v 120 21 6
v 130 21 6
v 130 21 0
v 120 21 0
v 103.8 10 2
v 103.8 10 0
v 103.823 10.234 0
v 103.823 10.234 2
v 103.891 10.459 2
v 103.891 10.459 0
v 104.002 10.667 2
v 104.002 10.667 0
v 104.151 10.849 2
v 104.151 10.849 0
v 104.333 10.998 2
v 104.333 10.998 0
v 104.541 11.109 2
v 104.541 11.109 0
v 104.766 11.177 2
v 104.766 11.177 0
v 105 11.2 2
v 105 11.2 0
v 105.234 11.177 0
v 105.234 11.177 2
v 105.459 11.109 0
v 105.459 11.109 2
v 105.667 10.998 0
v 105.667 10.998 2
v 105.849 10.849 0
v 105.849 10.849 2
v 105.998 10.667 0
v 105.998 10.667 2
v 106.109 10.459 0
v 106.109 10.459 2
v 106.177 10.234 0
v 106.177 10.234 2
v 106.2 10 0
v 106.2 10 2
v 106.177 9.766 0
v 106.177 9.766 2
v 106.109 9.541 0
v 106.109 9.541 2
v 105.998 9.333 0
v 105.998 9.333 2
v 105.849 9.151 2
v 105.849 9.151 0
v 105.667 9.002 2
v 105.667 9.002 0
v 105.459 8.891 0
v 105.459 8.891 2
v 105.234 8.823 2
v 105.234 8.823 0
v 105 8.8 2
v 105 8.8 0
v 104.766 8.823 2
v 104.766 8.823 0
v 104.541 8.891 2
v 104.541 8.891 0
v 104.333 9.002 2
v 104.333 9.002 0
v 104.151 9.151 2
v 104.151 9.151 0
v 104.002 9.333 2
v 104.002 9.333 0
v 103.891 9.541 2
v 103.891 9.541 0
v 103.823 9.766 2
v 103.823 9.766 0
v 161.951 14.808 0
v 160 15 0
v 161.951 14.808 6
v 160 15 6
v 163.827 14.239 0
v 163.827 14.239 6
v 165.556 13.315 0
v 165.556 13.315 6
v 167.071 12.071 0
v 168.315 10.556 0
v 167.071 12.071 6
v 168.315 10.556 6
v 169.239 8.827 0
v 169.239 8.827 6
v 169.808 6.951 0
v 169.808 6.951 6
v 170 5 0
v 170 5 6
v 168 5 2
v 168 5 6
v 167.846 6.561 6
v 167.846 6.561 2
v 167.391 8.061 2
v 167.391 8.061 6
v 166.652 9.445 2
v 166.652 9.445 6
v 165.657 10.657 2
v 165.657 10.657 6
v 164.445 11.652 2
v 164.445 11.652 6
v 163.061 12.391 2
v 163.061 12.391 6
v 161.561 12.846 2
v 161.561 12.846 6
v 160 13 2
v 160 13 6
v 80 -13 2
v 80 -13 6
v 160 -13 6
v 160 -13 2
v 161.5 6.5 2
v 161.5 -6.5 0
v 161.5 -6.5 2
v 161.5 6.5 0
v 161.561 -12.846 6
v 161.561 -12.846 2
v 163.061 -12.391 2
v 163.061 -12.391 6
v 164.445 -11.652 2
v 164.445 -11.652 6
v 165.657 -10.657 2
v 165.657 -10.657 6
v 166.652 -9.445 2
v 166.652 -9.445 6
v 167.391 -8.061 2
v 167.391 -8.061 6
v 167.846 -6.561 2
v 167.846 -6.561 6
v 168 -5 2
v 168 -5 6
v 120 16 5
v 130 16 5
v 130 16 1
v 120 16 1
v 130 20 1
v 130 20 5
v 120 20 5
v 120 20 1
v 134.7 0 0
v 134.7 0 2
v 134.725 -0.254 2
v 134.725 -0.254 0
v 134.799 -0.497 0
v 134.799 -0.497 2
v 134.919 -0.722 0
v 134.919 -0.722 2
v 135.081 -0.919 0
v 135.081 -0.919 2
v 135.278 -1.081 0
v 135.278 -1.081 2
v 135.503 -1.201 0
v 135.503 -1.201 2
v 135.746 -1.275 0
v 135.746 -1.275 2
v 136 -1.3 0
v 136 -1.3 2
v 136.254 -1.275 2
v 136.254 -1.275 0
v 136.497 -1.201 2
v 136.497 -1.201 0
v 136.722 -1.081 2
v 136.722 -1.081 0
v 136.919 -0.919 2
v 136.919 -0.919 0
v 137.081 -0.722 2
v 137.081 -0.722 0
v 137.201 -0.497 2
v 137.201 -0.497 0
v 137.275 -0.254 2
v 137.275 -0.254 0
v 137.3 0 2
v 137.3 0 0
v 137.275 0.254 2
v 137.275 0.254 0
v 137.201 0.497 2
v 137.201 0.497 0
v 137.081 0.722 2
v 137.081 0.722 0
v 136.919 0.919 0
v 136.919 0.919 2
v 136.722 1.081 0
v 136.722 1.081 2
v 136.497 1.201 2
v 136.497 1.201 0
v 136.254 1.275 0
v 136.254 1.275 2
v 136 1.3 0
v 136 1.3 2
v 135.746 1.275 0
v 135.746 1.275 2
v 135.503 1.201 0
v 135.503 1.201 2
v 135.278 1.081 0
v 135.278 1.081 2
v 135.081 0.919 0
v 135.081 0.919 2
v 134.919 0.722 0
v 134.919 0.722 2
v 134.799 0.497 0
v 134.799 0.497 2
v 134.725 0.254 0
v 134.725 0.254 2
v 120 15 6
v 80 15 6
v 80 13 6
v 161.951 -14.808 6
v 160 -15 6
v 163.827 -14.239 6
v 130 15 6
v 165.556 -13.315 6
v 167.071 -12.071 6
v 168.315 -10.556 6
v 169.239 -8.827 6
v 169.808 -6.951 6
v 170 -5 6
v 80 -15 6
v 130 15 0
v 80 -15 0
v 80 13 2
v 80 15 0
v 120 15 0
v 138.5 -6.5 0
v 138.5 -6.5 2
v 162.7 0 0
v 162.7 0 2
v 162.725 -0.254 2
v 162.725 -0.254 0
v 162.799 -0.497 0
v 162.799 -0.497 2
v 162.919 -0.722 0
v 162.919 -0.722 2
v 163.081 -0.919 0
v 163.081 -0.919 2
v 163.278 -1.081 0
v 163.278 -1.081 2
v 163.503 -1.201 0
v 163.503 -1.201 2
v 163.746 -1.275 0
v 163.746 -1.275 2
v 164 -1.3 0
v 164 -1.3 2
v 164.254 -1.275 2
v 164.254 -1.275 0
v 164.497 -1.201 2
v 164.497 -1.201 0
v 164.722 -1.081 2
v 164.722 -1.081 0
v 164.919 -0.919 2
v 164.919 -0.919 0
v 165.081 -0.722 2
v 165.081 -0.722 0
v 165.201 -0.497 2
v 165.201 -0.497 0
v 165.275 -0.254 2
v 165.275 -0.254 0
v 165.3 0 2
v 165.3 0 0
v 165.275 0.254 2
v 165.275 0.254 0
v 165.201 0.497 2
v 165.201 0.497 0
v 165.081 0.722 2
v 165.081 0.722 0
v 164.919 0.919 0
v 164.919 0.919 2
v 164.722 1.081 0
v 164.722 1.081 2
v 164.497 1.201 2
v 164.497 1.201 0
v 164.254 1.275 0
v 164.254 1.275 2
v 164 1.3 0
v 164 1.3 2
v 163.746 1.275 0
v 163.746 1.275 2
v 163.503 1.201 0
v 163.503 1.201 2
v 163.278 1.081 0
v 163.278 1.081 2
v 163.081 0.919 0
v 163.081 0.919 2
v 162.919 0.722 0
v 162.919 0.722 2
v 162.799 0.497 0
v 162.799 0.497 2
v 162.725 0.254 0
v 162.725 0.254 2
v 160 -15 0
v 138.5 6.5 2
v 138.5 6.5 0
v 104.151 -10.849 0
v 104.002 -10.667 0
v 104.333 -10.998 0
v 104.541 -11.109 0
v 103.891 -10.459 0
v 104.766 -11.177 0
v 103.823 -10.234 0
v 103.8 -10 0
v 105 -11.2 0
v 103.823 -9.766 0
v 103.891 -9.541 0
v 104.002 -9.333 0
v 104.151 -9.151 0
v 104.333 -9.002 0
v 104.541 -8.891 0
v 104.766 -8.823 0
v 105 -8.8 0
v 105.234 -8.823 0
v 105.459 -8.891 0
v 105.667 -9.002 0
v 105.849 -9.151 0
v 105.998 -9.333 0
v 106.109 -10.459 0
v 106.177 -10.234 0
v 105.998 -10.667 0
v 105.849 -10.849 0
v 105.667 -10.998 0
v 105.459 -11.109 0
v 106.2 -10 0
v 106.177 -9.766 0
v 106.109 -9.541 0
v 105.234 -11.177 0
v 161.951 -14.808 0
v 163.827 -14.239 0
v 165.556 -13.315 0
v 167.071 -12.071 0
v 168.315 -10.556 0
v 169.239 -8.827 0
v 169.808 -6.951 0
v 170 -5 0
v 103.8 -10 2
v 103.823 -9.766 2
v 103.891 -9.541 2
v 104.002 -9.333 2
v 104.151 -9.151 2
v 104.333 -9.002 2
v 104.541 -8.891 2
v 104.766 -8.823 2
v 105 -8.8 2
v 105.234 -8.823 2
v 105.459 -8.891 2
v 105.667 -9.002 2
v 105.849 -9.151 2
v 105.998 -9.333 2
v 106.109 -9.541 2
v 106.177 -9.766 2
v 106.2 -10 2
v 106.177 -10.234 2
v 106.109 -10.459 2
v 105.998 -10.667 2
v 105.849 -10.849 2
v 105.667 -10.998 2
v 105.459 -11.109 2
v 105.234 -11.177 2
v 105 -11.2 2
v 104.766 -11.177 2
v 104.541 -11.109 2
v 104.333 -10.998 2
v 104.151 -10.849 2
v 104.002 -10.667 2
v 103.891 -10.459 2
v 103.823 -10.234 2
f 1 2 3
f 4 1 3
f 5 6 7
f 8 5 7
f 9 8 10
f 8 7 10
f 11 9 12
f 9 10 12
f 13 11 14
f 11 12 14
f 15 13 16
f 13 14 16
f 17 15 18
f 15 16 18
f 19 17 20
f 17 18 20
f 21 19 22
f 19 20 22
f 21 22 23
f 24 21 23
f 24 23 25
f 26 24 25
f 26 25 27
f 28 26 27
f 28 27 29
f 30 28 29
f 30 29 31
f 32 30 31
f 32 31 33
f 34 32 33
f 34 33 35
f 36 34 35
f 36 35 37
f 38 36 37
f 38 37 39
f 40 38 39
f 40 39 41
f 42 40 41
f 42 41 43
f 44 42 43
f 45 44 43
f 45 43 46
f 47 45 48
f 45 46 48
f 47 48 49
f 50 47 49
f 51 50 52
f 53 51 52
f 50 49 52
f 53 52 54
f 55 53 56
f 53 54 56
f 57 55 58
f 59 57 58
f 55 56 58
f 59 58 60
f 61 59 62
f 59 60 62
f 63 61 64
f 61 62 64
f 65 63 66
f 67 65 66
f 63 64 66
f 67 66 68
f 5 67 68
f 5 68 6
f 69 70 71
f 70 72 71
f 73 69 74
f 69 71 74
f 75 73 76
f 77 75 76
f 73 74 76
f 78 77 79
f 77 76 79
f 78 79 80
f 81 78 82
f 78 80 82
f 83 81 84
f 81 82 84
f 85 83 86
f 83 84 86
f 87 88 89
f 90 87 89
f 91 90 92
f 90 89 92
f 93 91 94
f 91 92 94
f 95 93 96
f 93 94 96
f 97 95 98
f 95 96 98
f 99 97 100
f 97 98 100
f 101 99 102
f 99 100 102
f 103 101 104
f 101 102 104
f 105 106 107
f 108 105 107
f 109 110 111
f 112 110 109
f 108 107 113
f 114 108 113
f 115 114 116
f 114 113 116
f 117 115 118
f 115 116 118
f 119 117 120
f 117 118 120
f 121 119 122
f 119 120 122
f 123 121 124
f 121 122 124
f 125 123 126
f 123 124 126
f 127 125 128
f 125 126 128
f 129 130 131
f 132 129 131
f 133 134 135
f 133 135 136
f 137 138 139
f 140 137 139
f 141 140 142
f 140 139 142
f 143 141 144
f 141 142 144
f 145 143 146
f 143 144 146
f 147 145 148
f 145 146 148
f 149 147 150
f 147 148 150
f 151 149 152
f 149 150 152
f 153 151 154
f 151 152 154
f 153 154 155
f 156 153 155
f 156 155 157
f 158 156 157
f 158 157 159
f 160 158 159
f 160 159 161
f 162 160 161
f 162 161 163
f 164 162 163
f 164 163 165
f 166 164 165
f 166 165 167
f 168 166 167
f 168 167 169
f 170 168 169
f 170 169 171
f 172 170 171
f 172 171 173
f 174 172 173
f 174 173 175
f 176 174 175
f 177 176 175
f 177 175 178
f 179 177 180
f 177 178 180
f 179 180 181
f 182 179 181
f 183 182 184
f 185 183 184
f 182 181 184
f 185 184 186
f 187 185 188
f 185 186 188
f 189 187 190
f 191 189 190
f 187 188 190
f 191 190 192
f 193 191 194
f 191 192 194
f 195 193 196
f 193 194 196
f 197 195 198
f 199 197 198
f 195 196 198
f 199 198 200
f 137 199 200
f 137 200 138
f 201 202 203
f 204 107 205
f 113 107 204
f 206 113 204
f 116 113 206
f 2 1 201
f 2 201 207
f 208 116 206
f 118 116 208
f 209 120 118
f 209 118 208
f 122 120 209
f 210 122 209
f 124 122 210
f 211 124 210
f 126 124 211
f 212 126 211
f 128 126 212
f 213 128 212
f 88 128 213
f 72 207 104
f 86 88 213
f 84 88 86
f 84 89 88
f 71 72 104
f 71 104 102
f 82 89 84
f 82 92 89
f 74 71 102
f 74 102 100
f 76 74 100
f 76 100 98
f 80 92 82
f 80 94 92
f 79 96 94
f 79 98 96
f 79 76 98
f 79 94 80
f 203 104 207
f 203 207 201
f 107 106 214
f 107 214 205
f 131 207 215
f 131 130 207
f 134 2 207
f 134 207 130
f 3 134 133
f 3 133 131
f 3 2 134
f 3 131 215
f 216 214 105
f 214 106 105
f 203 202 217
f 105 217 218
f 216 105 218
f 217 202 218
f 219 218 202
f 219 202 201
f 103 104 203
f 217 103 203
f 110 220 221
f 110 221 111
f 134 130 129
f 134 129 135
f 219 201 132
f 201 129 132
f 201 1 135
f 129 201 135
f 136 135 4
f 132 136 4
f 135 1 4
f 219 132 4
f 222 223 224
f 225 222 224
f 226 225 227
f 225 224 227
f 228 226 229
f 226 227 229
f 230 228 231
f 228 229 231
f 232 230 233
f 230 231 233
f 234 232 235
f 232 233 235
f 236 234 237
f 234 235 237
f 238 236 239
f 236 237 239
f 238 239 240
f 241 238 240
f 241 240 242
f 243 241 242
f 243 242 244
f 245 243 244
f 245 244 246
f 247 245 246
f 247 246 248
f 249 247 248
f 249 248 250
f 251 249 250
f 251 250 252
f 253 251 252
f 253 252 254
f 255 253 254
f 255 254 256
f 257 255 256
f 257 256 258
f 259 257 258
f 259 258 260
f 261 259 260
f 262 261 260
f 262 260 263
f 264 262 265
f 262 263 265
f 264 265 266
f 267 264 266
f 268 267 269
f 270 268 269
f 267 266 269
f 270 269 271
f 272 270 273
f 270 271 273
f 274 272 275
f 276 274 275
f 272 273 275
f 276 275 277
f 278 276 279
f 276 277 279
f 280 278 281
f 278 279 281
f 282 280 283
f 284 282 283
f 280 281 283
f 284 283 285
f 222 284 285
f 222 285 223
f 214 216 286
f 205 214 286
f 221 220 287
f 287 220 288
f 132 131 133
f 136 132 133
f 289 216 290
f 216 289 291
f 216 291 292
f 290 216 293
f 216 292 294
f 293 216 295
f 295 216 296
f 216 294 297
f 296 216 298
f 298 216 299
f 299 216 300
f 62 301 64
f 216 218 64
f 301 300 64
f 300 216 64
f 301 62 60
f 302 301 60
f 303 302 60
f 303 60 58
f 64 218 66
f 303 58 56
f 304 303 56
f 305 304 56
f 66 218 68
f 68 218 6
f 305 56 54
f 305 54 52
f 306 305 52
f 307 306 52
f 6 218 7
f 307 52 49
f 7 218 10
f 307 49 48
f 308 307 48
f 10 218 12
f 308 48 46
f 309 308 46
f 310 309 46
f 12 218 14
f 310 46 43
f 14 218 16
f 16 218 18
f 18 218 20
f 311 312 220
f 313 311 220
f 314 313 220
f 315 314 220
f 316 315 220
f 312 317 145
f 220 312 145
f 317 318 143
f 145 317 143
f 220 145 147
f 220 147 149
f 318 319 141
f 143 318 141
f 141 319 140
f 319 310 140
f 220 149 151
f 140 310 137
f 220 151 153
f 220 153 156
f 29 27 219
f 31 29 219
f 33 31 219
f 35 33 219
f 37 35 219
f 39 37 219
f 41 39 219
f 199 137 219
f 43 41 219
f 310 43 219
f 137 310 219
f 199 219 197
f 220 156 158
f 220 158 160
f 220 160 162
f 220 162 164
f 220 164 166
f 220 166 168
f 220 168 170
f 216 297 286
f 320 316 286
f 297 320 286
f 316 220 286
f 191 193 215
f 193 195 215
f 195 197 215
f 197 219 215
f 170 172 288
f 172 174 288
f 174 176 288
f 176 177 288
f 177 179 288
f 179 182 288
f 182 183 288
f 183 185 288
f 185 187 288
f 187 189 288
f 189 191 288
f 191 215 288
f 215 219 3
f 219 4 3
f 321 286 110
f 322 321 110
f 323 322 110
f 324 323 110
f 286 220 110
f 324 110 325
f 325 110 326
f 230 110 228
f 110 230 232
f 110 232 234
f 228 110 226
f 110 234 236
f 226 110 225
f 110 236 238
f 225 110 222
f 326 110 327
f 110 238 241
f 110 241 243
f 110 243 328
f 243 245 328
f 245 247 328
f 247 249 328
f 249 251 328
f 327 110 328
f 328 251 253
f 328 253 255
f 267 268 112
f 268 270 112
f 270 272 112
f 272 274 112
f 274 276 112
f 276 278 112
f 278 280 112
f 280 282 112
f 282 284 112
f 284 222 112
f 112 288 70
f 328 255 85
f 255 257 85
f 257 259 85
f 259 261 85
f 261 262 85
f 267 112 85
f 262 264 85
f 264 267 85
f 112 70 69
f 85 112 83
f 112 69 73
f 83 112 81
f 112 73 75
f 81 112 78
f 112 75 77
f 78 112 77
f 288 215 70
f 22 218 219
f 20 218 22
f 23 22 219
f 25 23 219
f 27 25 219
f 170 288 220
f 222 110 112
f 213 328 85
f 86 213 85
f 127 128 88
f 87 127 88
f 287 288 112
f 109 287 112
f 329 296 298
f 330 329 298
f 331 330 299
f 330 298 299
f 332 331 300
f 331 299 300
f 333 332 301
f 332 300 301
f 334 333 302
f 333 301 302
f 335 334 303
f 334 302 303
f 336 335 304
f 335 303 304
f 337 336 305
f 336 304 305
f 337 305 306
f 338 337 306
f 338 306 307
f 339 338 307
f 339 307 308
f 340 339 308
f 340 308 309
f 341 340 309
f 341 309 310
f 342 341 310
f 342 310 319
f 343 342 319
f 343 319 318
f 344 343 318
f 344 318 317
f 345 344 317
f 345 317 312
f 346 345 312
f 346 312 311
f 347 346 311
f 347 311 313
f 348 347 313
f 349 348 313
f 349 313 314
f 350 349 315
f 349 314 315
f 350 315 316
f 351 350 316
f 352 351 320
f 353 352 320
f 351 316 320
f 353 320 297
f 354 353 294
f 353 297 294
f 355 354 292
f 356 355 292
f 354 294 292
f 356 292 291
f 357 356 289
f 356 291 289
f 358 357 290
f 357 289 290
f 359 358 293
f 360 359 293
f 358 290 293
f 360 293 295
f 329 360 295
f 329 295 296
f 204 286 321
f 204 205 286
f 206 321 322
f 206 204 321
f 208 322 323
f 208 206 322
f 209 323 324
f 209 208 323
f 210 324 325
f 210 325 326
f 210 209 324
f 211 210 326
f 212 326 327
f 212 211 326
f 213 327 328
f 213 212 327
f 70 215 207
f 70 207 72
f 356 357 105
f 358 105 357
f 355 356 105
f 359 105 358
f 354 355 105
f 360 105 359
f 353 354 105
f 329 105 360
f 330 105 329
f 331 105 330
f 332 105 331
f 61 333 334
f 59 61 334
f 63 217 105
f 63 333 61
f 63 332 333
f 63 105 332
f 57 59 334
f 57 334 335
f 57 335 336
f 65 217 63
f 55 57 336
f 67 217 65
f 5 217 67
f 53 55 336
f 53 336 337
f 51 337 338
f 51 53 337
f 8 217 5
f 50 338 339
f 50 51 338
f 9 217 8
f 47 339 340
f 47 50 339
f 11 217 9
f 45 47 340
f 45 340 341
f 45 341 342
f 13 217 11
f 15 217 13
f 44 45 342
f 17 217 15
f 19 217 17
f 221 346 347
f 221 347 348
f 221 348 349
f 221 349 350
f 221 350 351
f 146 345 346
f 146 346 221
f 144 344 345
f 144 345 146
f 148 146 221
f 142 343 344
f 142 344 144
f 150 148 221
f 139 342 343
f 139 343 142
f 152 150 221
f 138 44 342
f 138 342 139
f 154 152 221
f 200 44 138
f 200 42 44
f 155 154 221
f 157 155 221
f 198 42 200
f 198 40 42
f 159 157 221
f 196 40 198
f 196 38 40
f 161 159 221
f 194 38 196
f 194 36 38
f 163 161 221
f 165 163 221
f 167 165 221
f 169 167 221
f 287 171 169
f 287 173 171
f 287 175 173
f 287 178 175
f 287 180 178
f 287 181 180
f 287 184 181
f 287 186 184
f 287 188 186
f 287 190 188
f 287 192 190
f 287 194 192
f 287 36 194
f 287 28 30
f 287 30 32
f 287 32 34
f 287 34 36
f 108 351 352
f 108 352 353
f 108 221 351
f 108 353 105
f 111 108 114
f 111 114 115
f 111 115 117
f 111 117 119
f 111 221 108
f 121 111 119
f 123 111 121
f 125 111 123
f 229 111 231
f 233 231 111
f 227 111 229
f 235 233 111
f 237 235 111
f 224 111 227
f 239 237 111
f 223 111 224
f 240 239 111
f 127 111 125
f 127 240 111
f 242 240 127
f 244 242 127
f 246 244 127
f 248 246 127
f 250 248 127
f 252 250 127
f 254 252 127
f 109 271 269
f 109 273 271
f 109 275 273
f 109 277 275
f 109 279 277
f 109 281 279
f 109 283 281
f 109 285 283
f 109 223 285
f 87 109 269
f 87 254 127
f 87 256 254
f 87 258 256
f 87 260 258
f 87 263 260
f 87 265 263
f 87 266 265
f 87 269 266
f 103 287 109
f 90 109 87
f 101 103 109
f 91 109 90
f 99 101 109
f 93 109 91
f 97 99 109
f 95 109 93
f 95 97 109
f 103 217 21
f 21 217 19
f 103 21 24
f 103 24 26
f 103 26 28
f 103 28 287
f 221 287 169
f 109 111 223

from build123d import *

# Parameters (mm, degrees)
SZKIC1_R                    = 22.5
DODANIE_WYCI_GNI_CIE2_DEPTH = 13
SZKIC2_W                    = 220
SZKIC2_H                    = 30
DODANIE_WYCI_GNI_CIE3_DEPTH = 6
ZAOKR_GLENIE1_R             = 10
SZKIC4_R                    = 20.5
WYTNIJ_WYCI_GNI_CIE3_DEPTH  = 11
WYTNIJ_WYCI_GNI_CIE2_DEPTH  = 4
WYTNIJ_WYCI_GNI_CIE4_REACH  = 173.975
SZKIC8_W                    = 23
SZKIC8_H                    = 13
SZKIC12_R                   = 3.3
DODANIE_WYCI_GNI_CIE4_DEPTH = 3
OTW_R_POD_RUB_M21_D         = 2.6
OTW_R_POD_RUB_M23_D         = 2.6
SZKIC14_R                   = 3.3
DODANIE_WYCI_GNI_CIE5_DEPTH = 5
OTW_R_POD_RUB_M24_D         = 2.6
SZKIC15_W                   = 6
SZKIC15_H                   = 6
SZKIC15_W_2                 = 4
SZKIC15_H_2                 = 4
DODANIE_WYCI_GNI_CIE6_DEPTH = 10
SZYK_LINIOWY1_COUNT         = 2
SZYK_LINIOWY1_PITCH         = 70
OTW_R_POD_RUB_M25_D         = 2.4


with BuildPart() as part:
    # Szkic1 → Dodanie-wyciągnięcie2 (new body)
    with BuildSketch(Plane.XY):
        with Locations(Location((0, 0, 0), (0, 0, 180))):
            Circle(SZKIC1_R)
    extrude(amount=DODANIE_WYCI_GNI_CIE2_DEPTH)

    # Szkic2 → Dodanie-wyciągnięcie3 (add)
    with BuildSketch(Plane.XY):
        with Locations((60, 0)):
            Rectangle(SZKIC2_W, SZKIC2_H)
    extrude(amount=DODANIE_WYCI_GNI_CIE3_DEPTH)

    # Zaokrąglenie1
    zaokr_glenie1_edges = [part.edges().sort_by_distance(p)[0] for p in [
        (170, 15, 3),
        (-50, -15, 3),
        (170, -15, 3),
        (-50, 15, 3),
    ]]
    fillet(zaokr_glenie1_edges, radius=ZAOKR_GLENIE1_R)

    # Szkic4 → Wytnij-wyciągnięcie3 (cut)
    with BuildSketch(Plane.XY.offset(13)):
        Circle(SZKIC4_R)
    extrude(amount=-WYTNIJ_WYCI_GNI_CIE3_DEPTH, mode=Mode.SUBTRACT)

    # Szkic3 → Wytnij-wyciągnięcie2 (cut)
    with BuildSketch(Plane.XY.offset(6)):
        with BuildLine():
            Line((168, -5), (168, 5))
            ThreePointArc((168, 5), (165.656854249, 10.656854249), (160, 13))
            Line((160, 13), (20.766559657, 13))
            ThreePointArc((20.766559657, 13), (24.5, 0), (20.766559657, -13))
            Line((20.766559657, -13), (160, -13))
            ThreePointArc((160, -13), (165.656854249, -10.656854249), (168, -5))
        make_face()
        with BuildLine():
            Line((-48, 5), (-48, -5))
            ThreePointArc((-48, -5), (-45.656854249, -10.656854249), (-40, -13))
            Line((-40, -13), (-20.766559657, -13))
            ThreePointArc((-20.766559657, -13), (-24.5, 0), (-20.766559657, 13))
            Line((-20.766559657, 13), (-40, 13))
            ThreePointArc((-40, 13), (-45.656854249, 10.656854249), (-48, 5))
        make_face()
    extrude(amount=-WYTNIJ_WYCI_GNI_CIE2_DEPTH, mode=Mode.SUBTRACT)

    # Szkic8 → Wytnij-wyciągnięcie4 (cut, up to next)
    with BuildSketch(Plane.XY, mode=Mode.PRIVATE) as wytnij_wyci_gni_cie4_sk1:
        with Locations((150, 0)):
            Rectangle(SZKIC8_W, SZKIC8_H)
    wytnij_wyci_gni_cie4_tool1 = extrude(wytnij_wyci_gni_cie4_sk1.sketch, amount=WYTNIJ_WYCI_GNI_CIE4_REACH, mode=Mode.PRIVATE) & part.part
    add(wytnij_wyci_gni_cie4_tool1.solids().sort_by_distance((150, 0, 0))[0], mode=Mode.SUBTRACT)

    # Szkic12 → Dodanie-wyciągnięcie4 (add)
    with BuildSketch(Plane.XY.offset(2)):
        Circle(SZKIC12_R)
    extrude(amount=DODANIE_WYCI_GNI_CIE4_DEPTH)

    # Otwór pod śrubę M21 (through all)
    with Locations(Plane(origin=(0, 0, 0), x_dir=(1, 0, 0), z_dir=(0, 0, -1))):
        with Locations((0, 0)):
            Hole(OTW_R_POD_RUB_M21_D / 2)

    # Otwór pod śrubę M23 (through all)
    with Locations(Plane(origin=(0, 0, 0), x_dir=(1, 0, 0), z_dir=(0, 0, -1))):
        with Locations((136, 0), (164, 0)):
            Hole(OTW_R_POD_RUB_M23_D / 2)

    # Szkic14 → Dodanie-wyciągnięcie5 (add)
    with BuildSketch(Plane.XY.offset(2)):
        with Locations((-40, 0)):
            Circle(SZKIC14_R)
    extrude(amount=DODANIE_WYCI_GNI_CIE5_DEPTH)

    # Otwór pod śrubę M24 (through all)
    with Locations(Plane(origin=(-40, 0, 0), x_dir=(-1, 0, 0), z_dir=(0, 0, -1))):
        with Locations((0, 0)):
            Hole(OTW_R_POD_RUB_M24_D / 2)

    # Szkic15 → Dodanie-wyciągnięcie6 (add)
    with BuildSketch(Plane(origin=(130, 0, 0), x_dir=(0, 0, -1), z_dir=(1, 0, 0))):
        with Locations((-3, 18)):
            Rectangle(SZKIC15_W, SZKIC15_H)
        with Locations((-3, 18)):
            Rectangle(SZKIC15_W_2, SZKIC15_H_2, mode=Mode.SUBTRACT)
    dodanie_wyci_gni_cie6 = extrude(amount=-DODANIE_WYCI_GNI_CIE6_DEPTH)

    # Szyk liniowy1: Dodanie-wyciągnięcie6 ×2
    with Locations(*[(-i * SZYK_LINIOWY1_PITCH, 0, 0) for i in range(1, SZYK_LINIOWY1_COUNT)]):
        add(dodanie_wyci_gni_cie6)

    # Otwór pod śrubę M25 (through all)
    with Locations(Plane.XY.offset(2)):
        with Locations((55, -10), (105, -10), (105, 10), (55, 10)):
            Hole(OTW_R_POD_RUB_M25_D / 2)

    # Cięcie powierzchnią1
    split(bisect_by=Plane(origin=(80, 0, 0), x_dir=(0, 0, -1), z_dir=(1, 0, 0)), keep=Keep.TOP)


solid = part.part
